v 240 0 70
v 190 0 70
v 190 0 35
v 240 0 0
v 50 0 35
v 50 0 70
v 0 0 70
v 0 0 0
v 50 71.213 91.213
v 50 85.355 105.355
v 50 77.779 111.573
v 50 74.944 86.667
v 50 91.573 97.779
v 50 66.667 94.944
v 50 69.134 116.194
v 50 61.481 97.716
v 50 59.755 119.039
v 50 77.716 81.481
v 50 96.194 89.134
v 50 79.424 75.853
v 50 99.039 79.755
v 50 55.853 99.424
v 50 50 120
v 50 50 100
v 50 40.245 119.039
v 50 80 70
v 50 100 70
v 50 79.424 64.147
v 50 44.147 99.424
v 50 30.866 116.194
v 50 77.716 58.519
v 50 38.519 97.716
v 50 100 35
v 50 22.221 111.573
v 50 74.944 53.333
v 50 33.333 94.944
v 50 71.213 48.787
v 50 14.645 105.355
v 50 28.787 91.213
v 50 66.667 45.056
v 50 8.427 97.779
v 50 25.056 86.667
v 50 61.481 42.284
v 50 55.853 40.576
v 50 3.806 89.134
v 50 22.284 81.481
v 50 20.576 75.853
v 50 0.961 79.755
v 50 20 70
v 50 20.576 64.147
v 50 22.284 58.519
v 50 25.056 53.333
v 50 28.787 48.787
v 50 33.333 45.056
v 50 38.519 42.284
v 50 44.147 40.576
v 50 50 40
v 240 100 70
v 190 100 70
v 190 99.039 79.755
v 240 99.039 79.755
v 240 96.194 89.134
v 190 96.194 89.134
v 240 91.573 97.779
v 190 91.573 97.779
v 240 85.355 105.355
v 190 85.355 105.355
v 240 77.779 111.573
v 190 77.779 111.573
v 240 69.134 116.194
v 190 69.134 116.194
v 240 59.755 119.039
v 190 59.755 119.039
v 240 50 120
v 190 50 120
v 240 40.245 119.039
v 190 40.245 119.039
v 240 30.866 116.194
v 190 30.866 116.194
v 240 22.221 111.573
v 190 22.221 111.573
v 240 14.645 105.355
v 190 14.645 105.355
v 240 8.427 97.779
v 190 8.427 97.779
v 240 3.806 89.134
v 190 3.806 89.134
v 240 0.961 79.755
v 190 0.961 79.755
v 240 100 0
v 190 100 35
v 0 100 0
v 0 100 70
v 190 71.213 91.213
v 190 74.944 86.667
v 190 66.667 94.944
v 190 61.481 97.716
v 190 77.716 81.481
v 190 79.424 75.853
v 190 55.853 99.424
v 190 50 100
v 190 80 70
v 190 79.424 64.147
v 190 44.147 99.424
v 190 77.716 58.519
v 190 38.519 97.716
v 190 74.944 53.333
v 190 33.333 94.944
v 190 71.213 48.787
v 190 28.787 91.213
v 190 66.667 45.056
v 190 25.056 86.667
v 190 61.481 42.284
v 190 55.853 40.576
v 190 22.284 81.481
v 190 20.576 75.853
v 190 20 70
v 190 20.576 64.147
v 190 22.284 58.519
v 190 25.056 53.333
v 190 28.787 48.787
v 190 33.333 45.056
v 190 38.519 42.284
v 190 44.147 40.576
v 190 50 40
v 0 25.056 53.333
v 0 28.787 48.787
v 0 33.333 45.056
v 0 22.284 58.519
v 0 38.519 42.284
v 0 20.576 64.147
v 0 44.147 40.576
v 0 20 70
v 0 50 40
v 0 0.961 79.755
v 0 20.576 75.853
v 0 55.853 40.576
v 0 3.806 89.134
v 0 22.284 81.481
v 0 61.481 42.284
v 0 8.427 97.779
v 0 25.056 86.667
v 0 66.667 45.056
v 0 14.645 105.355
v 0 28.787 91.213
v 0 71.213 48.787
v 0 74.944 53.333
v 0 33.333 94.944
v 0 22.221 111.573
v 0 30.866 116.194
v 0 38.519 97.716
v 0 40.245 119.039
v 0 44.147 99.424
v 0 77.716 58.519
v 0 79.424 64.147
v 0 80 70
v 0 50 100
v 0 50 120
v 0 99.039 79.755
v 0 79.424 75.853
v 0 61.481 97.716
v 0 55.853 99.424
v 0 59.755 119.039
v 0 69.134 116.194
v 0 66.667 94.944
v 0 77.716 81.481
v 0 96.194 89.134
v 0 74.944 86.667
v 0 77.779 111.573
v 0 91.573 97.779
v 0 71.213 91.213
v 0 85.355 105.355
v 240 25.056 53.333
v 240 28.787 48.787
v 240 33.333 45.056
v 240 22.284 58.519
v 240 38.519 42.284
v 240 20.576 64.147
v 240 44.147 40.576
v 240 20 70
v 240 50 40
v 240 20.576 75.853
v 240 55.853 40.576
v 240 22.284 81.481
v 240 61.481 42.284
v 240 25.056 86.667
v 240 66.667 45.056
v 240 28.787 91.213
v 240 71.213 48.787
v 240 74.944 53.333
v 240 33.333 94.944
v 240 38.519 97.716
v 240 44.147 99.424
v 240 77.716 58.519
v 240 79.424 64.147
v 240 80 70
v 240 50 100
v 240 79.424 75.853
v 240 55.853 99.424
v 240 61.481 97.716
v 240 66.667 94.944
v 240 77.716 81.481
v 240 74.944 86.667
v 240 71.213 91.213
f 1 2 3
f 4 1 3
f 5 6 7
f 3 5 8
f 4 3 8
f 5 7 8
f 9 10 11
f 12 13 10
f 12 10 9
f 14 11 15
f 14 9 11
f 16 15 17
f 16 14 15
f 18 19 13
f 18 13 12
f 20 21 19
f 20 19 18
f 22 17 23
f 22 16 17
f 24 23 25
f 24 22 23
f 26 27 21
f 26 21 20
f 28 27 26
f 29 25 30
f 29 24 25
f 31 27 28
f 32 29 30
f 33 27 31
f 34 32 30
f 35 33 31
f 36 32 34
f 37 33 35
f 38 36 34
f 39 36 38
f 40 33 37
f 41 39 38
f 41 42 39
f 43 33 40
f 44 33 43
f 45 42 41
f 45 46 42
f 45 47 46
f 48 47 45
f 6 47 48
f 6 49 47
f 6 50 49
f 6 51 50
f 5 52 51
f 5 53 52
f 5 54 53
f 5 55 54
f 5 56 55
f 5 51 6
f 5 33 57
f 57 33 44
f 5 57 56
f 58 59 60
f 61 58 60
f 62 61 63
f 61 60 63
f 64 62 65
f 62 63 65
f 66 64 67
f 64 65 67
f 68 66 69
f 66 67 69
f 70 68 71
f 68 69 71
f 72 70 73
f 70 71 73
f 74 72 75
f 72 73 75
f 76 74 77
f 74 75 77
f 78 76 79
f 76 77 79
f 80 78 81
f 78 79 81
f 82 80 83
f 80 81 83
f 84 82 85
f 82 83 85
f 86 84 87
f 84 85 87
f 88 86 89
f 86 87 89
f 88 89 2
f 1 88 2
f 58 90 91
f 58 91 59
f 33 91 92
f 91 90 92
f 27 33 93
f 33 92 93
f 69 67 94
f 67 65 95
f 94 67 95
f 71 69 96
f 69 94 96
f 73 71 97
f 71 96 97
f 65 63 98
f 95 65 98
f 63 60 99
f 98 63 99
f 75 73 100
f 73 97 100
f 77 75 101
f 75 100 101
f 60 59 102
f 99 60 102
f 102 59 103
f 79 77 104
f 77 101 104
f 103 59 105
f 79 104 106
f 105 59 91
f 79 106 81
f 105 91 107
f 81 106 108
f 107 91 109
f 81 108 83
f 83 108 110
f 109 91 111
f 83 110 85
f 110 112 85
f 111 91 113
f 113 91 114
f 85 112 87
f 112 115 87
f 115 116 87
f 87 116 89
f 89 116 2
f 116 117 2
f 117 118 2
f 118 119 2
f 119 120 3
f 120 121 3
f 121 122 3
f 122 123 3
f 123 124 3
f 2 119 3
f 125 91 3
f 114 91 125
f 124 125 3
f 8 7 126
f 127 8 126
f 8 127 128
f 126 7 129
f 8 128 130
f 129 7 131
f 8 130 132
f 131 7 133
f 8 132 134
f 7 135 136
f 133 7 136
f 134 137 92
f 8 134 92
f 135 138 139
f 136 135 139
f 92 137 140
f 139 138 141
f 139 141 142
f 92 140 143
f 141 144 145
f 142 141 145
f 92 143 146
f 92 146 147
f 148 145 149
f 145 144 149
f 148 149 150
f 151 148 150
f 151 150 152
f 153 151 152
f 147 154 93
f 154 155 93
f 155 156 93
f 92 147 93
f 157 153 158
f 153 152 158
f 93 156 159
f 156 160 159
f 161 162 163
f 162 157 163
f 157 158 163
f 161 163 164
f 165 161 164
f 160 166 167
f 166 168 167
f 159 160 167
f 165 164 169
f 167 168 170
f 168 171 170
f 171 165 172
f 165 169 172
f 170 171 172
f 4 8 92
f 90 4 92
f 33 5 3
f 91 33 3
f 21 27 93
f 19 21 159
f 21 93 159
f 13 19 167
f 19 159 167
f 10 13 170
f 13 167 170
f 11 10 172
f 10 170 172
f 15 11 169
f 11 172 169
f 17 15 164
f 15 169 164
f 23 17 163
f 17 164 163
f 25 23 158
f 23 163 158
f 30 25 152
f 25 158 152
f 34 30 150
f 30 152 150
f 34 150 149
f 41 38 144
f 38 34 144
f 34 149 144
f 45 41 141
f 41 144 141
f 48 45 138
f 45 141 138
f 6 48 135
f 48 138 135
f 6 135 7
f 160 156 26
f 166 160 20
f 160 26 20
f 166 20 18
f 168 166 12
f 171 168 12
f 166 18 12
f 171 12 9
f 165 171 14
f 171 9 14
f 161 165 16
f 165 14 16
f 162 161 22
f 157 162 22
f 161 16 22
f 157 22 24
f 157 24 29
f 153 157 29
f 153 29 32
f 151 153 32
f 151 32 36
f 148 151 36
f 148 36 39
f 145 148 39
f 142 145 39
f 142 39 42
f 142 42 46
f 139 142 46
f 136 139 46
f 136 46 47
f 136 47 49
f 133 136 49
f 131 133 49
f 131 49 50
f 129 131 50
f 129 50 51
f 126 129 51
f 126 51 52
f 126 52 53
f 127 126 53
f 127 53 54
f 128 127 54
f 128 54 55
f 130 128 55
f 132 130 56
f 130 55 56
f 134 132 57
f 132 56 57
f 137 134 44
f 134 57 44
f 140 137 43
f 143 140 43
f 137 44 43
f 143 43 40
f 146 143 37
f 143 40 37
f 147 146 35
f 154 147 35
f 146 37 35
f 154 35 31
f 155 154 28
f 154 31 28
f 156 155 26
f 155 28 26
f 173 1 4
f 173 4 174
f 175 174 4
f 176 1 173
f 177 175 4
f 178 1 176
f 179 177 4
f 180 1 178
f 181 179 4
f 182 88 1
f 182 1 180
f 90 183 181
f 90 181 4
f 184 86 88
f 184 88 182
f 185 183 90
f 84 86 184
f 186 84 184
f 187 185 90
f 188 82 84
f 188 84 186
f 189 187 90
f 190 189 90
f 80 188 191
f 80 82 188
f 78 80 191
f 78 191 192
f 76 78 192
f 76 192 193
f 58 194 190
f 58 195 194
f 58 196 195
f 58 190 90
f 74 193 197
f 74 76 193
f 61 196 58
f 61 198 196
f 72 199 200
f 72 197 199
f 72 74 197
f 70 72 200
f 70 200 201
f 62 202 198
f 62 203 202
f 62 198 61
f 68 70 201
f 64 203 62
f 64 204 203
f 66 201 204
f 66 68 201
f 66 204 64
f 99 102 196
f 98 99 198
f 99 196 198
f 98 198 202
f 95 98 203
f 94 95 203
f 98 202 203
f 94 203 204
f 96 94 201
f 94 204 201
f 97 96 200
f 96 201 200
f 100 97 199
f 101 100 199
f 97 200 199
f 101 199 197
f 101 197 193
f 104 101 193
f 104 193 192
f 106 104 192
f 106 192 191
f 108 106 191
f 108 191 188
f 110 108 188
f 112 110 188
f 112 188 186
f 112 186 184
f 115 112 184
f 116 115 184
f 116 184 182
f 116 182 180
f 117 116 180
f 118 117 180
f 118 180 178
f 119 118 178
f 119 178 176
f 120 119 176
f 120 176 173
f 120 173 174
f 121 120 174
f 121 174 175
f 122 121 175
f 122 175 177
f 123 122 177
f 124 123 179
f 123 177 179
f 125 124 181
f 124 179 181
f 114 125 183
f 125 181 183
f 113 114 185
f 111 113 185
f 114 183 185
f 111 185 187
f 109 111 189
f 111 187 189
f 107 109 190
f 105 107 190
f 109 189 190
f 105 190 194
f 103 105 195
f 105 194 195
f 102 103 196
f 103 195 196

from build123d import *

# Parameters (mm, degrees)
F1_DEPTH = 240
F2_R     = 30
F3_DEPTH = 240
F5_W     = 140
F5_H     = 100
F6_DEPTH = 85.001


with BuildPart() as f1:
    # F0 (on Right) → F1 (new body)
    with BuildSketch(Plane.YZ):
        with BuildLine():
            Line((0, 70), (0, 0))
            Line((0, 0), (100, 0))
            Line((100, 0), (100, 70))
            ThreePointArc((100, 70), (50, 120), (0, 70))
        make_face()
    extrude(amount=F1_DEPTH)

    # F2 (on face) → F3 (cut, through all)
    with BuildSketch(Plane.YZ.offset(240)):
        with Locations((50, 70)):
            Circle(F2_R)
    extrude(amount=-F3_DEPTH, mode=Mode.SUBTRACT)

    # F5 (on offset) → F6 (cut, through all)
    with BuildSketch(Plane(origin=(0, 0, 35), x_dir=(1, 0, 0), z_dir=(0, 0, -1))):
        with Locations((120, -50)):
            Rectangle(F5_W, F5_H)
    extrude(amount=-F6_DEPTH, mode=Mode.SUBTRACT)


solid = f1.part
